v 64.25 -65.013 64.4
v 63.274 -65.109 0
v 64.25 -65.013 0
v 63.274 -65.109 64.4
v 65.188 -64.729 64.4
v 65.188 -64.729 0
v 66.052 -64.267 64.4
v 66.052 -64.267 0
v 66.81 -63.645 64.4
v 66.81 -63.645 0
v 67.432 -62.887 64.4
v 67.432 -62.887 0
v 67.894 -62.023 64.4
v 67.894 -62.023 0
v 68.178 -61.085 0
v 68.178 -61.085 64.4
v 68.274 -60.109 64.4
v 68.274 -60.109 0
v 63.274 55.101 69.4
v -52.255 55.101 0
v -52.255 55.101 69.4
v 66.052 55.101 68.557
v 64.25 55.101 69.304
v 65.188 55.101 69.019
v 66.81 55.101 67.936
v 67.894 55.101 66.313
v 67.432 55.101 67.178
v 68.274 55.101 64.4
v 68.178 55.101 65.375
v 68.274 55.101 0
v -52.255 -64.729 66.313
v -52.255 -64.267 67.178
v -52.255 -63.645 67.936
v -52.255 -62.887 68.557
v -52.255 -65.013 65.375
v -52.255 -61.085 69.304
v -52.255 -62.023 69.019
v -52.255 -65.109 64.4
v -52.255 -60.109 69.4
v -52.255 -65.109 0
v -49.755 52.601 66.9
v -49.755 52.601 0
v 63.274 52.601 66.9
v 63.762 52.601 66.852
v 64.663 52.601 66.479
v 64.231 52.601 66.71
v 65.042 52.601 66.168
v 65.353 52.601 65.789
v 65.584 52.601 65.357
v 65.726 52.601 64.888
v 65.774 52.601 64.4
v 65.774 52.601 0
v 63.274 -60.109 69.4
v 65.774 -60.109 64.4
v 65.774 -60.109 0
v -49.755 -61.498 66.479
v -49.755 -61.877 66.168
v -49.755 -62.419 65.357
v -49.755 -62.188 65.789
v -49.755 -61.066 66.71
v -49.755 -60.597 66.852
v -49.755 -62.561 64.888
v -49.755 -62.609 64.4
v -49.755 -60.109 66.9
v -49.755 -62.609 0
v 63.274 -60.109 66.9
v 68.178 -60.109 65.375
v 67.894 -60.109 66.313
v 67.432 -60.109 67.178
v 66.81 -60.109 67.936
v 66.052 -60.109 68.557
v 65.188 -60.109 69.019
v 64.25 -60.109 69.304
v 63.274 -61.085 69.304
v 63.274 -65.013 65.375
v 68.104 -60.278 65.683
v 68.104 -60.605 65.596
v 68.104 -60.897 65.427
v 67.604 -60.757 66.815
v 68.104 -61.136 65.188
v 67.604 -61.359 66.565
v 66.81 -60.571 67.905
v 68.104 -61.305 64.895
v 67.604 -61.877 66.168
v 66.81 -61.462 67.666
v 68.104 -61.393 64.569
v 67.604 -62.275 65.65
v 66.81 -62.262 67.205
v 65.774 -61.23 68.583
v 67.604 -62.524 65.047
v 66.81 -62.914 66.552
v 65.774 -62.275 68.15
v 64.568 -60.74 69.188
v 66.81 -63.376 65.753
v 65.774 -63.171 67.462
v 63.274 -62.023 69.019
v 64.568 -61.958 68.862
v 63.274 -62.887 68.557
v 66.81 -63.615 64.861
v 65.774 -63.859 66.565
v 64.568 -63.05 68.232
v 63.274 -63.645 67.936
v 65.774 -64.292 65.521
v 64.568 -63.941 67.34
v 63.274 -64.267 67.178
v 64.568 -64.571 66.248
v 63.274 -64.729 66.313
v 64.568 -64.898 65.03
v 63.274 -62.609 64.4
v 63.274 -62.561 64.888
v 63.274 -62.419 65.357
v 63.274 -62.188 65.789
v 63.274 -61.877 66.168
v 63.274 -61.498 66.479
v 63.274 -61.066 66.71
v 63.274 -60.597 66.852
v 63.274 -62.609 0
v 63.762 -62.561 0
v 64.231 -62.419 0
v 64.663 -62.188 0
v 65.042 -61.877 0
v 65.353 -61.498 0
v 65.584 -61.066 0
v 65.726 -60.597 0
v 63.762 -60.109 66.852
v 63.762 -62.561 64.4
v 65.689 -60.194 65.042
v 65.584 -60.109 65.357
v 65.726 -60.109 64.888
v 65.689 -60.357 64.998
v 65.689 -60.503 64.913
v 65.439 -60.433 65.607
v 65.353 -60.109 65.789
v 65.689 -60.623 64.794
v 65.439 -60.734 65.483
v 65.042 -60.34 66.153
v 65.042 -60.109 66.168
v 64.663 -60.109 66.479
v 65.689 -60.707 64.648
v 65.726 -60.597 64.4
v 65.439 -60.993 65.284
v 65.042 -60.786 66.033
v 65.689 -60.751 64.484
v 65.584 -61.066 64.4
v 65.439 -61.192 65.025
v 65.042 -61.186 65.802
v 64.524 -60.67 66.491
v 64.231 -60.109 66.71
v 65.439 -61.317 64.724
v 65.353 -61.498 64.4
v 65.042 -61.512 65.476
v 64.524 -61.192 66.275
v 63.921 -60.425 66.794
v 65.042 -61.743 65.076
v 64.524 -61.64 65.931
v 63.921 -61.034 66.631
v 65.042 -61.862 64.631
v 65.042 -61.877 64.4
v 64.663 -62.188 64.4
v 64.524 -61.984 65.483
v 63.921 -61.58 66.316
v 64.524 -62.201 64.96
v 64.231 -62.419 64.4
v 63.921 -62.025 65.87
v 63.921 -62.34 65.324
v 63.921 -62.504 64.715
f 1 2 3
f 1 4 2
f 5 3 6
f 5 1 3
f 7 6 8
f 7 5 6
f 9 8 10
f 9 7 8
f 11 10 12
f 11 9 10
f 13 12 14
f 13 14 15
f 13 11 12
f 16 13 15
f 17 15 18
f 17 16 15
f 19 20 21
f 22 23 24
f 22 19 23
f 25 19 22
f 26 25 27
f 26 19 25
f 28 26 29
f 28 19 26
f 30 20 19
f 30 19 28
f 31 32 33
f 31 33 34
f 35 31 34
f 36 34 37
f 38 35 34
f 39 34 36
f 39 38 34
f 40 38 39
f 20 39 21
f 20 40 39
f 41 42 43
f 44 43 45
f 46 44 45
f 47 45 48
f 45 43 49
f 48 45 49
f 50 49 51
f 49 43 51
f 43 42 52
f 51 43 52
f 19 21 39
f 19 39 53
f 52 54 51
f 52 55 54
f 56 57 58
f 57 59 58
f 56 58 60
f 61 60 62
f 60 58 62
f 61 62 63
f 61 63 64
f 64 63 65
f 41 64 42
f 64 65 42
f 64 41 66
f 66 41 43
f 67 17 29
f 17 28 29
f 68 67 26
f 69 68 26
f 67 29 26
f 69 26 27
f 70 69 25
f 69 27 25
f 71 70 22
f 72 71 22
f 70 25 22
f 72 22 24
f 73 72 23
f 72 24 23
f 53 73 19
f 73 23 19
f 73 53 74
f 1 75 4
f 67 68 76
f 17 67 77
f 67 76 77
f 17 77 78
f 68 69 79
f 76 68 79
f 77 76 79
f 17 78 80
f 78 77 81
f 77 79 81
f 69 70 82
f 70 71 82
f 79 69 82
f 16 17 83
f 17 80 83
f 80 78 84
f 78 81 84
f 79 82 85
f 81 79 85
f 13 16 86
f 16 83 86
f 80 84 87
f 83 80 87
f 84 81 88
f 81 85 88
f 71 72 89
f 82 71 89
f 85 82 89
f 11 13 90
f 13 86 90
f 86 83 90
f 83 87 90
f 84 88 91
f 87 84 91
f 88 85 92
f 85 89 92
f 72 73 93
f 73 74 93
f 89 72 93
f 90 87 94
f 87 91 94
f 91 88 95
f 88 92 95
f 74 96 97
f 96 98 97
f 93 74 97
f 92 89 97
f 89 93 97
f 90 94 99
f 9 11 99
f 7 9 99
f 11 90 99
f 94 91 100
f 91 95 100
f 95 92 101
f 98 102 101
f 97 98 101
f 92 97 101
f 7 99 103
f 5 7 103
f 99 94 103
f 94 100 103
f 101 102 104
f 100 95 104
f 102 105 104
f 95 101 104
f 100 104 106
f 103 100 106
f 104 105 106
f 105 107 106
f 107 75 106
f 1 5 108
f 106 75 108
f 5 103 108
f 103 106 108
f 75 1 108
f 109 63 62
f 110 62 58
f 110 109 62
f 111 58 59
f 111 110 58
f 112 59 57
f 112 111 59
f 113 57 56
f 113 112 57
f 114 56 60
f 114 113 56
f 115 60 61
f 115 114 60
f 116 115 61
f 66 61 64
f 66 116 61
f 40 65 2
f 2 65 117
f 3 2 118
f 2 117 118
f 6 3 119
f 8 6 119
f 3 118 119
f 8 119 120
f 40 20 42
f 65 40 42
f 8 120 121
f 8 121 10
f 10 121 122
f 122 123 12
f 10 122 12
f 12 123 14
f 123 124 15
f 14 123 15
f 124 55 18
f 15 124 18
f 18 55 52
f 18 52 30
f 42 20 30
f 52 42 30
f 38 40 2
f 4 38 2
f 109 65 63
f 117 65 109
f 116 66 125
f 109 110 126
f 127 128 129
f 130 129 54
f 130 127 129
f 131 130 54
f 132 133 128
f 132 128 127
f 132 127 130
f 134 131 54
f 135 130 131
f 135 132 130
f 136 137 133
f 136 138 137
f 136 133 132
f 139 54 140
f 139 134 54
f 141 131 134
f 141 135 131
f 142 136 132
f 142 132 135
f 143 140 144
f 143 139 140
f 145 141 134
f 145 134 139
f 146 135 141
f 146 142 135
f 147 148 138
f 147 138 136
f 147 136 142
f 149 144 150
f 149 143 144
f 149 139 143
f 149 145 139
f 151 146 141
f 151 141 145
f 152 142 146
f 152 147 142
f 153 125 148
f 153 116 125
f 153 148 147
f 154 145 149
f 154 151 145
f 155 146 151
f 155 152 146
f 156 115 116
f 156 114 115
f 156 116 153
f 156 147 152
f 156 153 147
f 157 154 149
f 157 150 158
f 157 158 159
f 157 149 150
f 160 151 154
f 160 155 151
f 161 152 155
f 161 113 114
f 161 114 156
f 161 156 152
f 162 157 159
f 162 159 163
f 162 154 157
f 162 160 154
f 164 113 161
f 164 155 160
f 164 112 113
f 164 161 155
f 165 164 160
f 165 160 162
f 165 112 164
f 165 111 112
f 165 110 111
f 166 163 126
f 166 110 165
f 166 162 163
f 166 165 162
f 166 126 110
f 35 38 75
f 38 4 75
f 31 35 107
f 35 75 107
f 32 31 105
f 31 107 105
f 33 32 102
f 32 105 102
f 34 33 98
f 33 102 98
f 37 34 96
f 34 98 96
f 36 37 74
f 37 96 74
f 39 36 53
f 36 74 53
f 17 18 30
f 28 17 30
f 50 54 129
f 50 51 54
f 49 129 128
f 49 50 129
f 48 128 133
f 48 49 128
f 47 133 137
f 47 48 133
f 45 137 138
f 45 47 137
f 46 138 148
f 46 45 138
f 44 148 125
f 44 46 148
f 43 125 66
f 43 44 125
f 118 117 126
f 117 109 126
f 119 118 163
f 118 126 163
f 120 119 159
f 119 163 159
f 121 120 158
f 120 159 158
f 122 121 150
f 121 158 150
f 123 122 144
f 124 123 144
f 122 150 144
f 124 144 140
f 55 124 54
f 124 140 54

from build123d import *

# Parameters (mm, degrees)
F0_W     = 120.528899
F0_H     = 120.2101
F1_DEPTH = 69.4
F2_R     = 5
F3_T     = -2.5


with BuildPart() as f1:
    # F0 (on Top) → F1 (new body)
    with BuildSketch(Plane.XY):
        with Locations((8.009833, -5.004426)):
            Rectangle(F0_W, F0_H)
    extrude(amount=F1_DEPTH)

    # F2
    f2_edges = [f1.edges().sort_by_distance(p)[0] for p in [
        (8.009832, -65.109476, 69.4),
        (68.274282, -5.004426, 69.4),
        (68.274282, -65.109476, 34.7),
    ]]
    fillet(f2_edges, radius=F2_R)

    # F3
    f3_openings = [f1.faces().sort_by_distance(p)[0] for p in [
        (7.987923, -4.982576, 0),
    ]]
    offset(amount=F3_T, openings=f3_openings)


solid = f1.part
